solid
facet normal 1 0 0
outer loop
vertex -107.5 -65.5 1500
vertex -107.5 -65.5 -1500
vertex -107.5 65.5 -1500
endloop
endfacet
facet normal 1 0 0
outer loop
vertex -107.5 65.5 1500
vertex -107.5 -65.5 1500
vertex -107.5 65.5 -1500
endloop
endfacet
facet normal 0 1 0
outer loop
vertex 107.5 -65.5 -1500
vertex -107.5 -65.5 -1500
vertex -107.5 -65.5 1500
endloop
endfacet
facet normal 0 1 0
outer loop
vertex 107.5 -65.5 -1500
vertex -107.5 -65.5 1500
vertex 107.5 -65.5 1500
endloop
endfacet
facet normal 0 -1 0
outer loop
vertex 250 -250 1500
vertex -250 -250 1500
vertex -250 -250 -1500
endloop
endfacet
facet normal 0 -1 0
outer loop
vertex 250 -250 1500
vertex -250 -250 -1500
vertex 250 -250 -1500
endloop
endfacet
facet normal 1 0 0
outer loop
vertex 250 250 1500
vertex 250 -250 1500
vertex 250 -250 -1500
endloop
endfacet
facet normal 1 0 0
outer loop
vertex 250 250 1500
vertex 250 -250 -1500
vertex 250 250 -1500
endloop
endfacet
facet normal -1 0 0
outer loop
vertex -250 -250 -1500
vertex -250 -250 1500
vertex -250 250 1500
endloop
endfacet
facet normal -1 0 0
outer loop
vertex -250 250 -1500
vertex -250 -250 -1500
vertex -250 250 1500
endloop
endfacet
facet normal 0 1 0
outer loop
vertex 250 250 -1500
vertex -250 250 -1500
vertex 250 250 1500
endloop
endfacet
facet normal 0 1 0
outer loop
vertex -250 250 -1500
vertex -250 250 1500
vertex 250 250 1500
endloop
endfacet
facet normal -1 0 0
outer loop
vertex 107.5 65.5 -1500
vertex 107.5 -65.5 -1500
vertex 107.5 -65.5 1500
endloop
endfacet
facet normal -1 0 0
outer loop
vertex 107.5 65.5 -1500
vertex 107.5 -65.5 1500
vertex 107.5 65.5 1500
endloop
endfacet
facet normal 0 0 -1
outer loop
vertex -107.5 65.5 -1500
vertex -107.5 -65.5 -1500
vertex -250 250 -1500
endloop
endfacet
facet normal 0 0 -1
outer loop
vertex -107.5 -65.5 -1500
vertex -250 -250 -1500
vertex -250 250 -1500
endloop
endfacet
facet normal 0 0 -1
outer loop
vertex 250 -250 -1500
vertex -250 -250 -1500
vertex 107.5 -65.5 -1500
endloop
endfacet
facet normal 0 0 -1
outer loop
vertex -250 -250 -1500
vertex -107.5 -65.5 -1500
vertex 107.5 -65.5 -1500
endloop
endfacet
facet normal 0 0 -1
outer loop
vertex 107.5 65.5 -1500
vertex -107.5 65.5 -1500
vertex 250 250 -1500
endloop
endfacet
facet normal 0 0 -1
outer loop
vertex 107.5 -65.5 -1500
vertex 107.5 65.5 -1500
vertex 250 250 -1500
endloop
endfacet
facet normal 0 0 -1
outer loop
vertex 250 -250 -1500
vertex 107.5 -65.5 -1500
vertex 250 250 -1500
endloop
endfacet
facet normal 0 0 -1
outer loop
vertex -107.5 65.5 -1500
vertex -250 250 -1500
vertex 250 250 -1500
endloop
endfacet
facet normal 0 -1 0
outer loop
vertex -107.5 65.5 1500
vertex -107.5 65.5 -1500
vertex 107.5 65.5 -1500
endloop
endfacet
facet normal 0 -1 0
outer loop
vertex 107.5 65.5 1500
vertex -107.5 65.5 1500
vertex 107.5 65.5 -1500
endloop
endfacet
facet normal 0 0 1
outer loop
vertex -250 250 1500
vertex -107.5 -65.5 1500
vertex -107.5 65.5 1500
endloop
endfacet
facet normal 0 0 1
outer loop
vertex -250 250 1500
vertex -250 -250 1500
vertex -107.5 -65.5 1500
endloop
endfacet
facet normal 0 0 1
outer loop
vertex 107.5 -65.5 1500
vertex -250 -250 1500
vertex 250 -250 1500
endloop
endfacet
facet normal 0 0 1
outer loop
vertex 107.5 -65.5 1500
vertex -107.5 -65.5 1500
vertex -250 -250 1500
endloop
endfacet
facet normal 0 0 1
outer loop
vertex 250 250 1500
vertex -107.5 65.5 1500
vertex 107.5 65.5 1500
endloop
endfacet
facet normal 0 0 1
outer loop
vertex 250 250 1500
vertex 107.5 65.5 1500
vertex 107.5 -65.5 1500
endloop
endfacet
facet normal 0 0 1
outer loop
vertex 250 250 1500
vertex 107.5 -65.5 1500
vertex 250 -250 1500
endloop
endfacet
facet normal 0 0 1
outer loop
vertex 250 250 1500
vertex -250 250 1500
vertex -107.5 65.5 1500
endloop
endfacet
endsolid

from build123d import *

# Parameters (mm, degrees)
SKETCH_W   = 500
SKETCH_H   = 500
SKETCH_W_2 = 215
SKETCH_H_2 = 131
PAD_DEPTH  = 1500


with BuildPart() as part:
    # Sketch → Pad (new body, symmetric)
    with BuildSketch(Plane.XY):
        Rectangle(SKETCH_W, SKETCH_H)
        Rectangle(SKETCH_W_2, SKETCH_H_2, mode=Mode.SUBTRACT)
    extrude(amount=PAD_DEPTH, both=True)


solid = part.part
